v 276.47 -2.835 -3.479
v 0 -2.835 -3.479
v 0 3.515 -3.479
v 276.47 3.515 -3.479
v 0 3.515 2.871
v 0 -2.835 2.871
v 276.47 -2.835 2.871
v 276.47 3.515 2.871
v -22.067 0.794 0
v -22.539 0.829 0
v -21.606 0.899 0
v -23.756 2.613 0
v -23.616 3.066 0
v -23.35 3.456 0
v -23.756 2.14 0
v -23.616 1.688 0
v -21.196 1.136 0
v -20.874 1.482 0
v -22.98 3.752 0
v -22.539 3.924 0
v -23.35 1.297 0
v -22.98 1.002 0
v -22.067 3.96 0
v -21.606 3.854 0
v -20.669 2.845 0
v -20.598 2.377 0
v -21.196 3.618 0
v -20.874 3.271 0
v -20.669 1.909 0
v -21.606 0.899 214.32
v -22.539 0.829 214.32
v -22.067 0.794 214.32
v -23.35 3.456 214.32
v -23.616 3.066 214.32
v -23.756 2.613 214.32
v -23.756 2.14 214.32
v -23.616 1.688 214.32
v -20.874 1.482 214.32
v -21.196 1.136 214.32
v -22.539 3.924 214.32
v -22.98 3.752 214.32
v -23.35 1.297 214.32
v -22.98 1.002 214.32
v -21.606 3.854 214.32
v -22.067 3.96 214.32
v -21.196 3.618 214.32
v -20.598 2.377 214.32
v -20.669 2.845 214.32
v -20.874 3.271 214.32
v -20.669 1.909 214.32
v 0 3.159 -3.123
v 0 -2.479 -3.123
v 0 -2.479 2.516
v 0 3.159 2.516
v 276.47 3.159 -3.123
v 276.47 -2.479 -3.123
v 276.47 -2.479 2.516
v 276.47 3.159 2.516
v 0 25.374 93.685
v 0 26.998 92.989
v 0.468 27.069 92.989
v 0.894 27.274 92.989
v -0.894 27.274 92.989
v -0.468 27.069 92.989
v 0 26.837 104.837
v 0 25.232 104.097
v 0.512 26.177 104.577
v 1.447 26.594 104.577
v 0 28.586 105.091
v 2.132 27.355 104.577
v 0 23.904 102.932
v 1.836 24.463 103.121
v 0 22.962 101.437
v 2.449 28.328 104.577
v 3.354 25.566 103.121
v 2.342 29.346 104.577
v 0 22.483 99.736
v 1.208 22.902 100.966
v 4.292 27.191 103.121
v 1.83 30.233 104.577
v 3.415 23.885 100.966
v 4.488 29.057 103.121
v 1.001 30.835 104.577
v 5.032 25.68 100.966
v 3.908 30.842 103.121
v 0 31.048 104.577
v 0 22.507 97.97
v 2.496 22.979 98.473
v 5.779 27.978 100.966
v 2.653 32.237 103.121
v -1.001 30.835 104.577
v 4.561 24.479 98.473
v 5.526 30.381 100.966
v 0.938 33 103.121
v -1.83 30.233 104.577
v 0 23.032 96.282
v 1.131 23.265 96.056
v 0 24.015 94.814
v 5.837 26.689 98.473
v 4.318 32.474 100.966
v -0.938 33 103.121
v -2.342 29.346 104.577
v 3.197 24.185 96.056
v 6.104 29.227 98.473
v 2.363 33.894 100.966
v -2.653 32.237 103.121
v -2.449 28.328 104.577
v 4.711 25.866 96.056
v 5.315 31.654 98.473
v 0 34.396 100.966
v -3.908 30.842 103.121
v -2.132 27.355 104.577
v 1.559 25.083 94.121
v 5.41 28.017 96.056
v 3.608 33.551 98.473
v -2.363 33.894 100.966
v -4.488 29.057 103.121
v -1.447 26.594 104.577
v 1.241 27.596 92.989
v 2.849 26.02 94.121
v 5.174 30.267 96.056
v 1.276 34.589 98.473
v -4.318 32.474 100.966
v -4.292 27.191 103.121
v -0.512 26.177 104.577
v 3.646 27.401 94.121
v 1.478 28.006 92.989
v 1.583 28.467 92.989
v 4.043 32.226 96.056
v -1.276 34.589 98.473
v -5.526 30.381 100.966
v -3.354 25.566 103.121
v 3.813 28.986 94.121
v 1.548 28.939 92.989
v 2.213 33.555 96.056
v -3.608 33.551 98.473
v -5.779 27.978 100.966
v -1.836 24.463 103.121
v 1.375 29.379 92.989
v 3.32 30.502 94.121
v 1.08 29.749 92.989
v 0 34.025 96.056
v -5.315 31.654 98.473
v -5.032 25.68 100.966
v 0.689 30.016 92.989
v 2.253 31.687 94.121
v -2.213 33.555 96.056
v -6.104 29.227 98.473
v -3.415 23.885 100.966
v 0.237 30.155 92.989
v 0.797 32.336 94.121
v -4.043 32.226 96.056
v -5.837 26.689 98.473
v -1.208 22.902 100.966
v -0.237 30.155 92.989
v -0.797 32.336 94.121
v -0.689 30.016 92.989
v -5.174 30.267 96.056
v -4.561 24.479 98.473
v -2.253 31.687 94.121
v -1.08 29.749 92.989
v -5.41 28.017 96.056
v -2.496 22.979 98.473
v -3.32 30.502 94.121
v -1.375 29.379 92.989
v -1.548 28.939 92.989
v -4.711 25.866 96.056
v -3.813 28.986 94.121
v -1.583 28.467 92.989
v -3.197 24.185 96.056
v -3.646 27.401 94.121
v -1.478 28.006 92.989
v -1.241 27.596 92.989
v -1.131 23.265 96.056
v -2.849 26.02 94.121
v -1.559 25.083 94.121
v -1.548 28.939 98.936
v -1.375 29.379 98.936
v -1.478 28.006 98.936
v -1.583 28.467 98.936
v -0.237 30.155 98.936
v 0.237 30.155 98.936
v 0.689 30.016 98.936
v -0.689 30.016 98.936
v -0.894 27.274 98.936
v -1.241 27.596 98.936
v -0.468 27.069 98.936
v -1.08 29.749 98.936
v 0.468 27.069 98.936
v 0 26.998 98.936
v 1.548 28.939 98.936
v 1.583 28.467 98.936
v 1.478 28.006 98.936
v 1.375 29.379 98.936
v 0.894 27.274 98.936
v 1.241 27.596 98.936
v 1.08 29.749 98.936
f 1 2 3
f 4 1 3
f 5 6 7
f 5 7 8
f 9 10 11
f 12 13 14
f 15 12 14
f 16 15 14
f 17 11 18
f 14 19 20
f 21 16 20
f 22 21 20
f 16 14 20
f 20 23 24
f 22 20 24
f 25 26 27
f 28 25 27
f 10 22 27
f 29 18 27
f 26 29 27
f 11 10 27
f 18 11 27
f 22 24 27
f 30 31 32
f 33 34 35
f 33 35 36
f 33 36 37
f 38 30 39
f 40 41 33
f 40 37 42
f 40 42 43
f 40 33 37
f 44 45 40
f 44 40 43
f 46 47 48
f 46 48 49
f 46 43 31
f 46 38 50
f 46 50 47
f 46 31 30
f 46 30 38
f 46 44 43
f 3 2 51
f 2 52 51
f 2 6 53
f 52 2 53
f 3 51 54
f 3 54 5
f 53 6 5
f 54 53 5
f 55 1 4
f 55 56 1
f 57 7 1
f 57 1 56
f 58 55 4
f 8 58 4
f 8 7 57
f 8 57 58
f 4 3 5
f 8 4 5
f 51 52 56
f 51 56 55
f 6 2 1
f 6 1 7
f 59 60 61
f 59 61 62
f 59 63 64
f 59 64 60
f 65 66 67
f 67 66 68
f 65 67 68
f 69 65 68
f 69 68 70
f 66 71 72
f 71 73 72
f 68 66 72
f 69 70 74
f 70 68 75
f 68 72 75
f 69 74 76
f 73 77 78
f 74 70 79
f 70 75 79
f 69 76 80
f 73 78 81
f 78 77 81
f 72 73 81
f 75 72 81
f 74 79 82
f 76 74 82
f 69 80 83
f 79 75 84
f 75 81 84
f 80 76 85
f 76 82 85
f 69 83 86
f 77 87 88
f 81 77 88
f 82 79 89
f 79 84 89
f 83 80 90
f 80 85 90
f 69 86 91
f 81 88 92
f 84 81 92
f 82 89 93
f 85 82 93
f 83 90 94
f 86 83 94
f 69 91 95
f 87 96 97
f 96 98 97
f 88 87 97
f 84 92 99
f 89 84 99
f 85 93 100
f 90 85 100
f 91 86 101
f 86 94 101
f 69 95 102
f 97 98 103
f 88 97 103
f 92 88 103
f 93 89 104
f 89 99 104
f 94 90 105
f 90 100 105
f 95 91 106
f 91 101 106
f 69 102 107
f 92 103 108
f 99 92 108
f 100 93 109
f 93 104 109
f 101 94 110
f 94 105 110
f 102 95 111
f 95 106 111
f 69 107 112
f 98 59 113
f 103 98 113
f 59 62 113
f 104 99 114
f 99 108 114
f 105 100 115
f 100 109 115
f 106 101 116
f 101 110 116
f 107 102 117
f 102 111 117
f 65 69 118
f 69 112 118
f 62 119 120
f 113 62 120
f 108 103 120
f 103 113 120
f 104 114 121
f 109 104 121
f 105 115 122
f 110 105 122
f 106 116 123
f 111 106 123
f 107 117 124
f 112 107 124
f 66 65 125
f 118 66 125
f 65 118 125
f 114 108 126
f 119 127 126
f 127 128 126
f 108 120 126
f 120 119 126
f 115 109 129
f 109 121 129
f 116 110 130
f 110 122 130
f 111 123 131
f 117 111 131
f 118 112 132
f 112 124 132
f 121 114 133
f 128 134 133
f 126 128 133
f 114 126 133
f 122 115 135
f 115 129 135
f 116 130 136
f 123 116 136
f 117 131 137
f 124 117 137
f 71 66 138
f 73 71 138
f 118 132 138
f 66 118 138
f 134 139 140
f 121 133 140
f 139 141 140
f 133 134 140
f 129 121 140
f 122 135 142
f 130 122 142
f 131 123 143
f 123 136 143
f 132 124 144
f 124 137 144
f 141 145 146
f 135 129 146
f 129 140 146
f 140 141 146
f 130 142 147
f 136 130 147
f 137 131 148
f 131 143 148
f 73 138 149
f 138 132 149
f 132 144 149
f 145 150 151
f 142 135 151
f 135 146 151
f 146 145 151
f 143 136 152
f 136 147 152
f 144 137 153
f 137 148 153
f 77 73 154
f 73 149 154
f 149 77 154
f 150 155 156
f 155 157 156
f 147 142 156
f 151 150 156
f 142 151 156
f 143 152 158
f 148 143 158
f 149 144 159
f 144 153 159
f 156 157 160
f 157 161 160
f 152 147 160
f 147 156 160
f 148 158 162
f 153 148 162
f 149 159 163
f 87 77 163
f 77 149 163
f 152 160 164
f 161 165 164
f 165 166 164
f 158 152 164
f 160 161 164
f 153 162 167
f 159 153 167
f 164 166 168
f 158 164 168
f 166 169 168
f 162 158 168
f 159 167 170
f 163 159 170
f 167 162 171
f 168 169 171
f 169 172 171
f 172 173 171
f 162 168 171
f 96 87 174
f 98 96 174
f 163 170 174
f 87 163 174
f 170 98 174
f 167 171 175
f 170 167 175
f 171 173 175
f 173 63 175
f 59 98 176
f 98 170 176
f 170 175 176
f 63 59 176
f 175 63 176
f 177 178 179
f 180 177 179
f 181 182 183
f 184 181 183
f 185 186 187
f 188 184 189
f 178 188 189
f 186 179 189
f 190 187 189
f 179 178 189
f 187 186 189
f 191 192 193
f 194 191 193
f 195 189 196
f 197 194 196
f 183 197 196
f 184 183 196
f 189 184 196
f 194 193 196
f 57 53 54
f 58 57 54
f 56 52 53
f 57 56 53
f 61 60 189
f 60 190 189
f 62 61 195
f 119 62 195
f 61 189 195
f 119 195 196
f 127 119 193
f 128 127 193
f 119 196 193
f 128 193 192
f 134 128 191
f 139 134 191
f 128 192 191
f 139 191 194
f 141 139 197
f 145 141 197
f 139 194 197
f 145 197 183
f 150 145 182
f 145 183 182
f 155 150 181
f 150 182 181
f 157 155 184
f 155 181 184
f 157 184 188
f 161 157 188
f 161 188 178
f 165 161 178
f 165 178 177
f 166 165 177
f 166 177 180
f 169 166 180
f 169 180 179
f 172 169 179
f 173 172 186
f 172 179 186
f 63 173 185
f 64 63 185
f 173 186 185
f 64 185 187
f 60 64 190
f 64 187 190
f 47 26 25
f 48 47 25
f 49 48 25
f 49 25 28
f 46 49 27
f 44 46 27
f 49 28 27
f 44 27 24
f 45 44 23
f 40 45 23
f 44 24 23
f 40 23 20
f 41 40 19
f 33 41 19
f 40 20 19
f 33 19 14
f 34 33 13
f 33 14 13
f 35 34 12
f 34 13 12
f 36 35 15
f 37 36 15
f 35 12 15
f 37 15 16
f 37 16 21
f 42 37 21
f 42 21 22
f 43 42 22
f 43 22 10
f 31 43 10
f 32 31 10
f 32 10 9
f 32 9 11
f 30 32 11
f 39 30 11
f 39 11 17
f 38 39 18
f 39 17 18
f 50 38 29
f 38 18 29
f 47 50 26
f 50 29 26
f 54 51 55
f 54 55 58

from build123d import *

# Parameters (mm, degrees)
F4_W     = 6.35
F4_H     = 6.35
F4_W_2   = 5.6388
F4_H_2   = 5.6388
F5_DEPTH = 276.47
F6_R     = 1.5875
F7_DEPTH = 214.32


with BuildPart() as f3:
    # F2 (on Right) → F3 (revolve)
    with BuildSketch(Plane.YZ):
        with BuildLine():
            Line((28.5856276751, 98.9358499646), (28.5856276751, 105.0908499646))
            ThreePointArc((28.5856276751, 105.0908499646), (22.482911541, 99.7364002676), (26.9981276751, 92.9890971742))
            Line((26.9981276751, 92.9890971742), (26.9981276751, 98.9358499646))
            Line((26.9981276751, 98.9358499646), (28.5856276751, 98.9358499646))
        make_face()
    revolve(axis=Axis((0, 28.5856276751, 102.0133499646), (0, 0, 1)))


with BuildPart() as f5:
    # F4 (on Right) → F5 (new body)
    with BuildSketch(Plane.YZ):
        with Locations((0.3399441484, -0.3035154659)):
            Rectangle(F4_W, F4_H)
        with Locations((0.3399441484, -0.3035154659)):
            Rectangle(F4_W_2, F4_H_2, mode=Mode.SUBTRACT)
    extrude(amount=F5_DEPTH)


with BuildPart() as f7:
    # F6 (on Top) → F7 (new body)
    with BuildSketch(Plane.XY):
        with Locations((-22.1857912838, 2.3767193779)):
            Circle(F6_R)
    extrude(amount=F7_DEPTH)


solid = Compound([f3.part, f5.part, f7.part])
